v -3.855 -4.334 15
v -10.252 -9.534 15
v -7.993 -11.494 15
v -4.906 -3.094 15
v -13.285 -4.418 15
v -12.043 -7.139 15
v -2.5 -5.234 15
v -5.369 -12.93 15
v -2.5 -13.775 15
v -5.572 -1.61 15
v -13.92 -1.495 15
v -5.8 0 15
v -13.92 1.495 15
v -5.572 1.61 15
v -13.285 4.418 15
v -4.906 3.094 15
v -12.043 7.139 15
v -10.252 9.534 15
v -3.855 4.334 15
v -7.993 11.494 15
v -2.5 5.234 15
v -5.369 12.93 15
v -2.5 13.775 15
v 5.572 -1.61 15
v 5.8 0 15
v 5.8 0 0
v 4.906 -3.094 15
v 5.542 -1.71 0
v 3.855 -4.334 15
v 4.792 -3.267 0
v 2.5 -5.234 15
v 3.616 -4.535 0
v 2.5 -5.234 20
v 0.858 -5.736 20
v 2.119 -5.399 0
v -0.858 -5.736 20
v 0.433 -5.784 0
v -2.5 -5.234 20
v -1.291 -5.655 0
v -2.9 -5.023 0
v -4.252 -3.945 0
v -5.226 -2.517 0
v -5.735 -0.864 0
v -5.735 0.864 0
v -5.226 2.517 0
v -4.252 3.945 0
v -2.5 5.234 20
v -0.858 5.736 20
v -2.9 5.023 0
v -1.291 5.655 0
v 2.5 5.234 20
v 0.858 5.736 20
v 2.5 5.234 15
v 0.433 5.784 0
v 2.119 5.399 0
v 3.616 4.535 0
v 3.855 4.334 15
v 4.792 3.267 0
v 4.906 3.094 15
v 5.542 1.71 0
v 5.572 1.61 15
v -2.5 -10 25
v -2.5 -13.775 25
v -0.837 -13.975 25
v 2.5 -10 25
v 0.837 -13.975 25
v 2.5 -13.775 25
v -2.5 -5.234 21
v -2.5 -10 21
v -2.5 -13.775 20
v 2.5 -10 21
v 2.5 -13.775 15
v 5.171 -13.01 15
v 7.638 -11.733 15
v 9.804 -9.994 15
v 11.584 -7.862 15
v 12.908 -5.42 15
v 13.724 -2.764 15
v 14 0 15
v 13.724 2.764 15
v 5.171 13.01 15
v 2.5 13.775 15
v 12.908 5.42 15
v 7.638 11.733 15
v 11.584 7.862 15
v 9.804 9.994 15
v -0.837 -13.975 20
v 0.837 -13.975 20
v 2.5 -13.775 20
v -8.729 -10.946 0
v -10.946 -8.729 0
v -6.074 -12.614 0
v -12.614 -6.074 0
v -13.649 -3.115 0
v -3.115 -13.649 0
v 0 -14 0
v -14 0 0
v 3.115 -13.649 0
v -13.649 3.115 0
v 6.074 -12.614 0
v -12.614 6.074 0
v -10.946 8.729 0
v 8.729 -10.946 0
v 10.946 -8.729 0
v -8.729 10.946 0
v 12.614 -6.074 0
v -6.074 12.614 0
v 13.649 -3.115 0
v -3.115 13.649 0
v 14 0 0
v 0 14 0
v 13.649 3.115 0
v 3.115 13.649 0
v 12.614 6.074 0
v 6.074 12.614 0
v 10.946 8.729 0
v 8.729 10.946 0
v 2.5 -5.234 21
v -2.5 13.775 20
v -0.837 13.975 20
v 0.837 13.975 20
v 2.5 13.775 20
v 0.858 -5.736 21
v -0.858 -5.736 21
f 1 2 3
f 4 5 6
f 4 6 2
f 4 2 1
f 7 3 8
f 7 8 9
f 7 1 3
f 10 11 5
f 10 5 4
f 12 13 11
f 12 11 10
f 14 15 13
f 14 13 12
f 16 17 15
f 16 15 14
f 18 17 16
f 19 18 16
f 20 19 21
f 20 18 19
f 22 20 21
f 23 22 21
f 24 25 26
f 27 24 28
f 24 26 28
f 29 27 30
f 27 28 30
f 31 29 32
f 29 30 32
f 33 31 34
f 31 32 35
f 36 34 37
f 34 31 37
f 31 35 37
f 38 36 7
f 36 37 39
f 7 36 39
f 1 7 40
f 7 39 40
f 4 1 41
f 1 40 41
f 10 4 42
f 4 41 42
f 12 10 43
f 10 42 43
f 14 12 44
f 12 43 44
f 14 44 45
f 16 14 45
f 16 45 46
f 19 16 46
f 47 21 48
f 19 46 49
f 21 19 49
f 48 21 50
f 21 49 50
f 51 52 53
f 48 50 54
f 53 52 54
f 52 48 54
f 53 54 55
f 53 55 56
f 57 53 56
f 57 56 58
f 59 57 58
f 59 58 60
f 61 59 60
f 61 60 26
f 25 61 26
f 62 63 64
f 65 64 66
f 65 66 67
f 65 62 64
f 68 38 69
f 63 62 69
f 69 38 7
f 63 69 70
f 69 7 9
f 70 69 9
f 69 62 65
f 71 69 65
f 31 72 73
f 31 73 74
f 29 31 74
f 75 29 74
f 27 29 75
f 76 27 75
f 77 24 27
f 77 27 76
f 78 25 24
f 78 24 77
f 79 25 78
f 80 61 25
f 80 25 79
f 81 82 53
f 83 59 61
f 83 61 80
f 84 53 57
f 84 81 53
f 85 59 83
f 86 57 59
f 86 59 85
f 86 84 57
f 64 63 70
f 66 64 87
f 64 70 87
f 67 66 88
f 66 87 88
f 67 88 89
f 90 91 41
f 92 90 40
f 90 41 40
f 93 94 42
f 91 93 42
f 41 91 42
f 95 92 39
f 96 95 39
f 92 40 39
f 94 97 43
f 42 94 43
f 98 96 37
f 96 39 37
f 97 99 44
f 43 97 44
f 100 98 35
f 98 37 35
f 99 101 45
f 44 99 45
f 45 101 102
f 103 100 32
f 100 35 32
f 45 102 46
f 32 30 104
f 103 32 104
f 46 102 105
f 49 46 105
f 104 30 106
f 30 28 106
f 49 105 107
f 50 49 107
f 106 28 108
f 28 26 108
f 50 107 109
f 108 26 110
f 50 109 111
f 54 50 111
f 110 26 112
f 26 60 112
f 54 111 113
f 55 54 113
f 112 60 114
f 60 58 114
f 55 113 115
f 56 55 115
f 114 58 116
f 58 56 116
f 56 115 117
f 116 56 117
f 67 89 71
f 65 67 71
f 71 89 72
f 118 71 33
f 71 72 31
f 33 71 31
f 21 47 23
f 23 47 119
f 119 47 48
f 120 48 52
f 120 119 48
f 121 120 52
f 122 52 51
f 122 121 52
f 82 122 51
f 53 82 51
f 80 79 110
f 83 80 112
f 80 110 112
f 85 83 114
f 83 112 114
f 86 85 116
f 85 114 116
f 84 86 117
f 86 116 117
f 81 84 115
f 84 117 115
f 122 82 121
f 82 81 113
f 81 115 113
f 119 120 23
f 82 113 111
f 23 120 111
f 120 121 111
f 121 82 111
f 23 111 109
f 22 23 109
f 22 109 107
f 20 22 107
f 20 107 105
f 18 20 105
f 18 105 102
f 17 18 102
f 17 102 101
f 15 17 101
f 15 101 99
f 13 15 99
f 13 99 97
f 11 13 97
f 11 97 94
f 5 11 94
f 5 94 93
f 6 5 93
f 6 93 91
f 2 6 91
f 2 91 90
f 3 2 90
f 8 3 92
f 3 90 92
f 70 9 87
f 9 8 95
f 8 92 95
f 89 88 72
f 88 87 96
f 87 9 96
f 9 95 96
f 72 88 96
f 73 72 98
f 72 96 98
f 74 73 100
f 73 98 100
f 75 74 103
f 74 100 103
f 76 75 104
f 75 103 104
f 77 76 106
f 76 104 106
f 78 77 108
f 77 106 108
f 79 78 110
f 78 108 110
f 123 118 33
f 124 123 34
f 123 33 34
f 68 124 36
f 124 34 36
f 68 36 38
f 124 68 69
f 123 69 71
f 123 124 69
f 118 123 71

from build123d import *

# Parameters (mm, degrees)
F0_R     = 14
F1_DEPTH = 20
F2_R     = 5.8
F3_DEPTH = 20.001
F5_DEPTH = 5
F6_DEPTH = 5
F7_DEPTH = 5
F9_DEPTH = 4


with BuildPart() as f1:
    # F0 (on Top) → F1 (new body)
    with BuildSketch(Plane.XY):
        Circle(F0_R)
    extrude(amount=F1_DEPTH)

    # F2 (on face) → F3 (cut, through all)
    with BuildSketch(Plane(origin=(0, 0, 0), x_dir=(1, 0, 0), z_dir=(0, 0, -1))):
        Circle(F2_R)
    extrude(amount=-F3_DEPTH, mode=Mode.SUBTRACT)

    # F4 (on face) → F5 (cut)
    with BuildSketch(Plane.XY.offset(20)):
        with BuildLine():
            Line((-2.5, 5.2335456433), (-2.5, 13.774977314))
            ThreePointArc((-2.5, 13.774977314), (-14, 0), (-2.5, -13.774977314))
            Line((-2.5, -13.774977314), (-2.5, -5.2335456433))
            ThreePointArc((-2.5, -5.2335456433), (-5.8, 0), (-2.5, 5.2335456433))
        make_face()
    extrude(amount=-F5_DEPTH, mode=Mode.SUBTRACT)

    # F4 (on face) → F6 (cut)
    with BuildSketch(Plane.XY.offset(20)):
        with BuildLine():
            ThreePointArc((14, 0), (10.7470926301, 8.9721792225), (2.5, 13.774977314))
            Line((2.5, 13.774977314), (2.5, 5.2335456433))
            ThreePointArc((2.5, 5.2335456433), (4.9061186288, 3.0935416597), (5.8, 0))
            ThreePointArc((5.8, 0), (4.9061186288, -3.0935416597), (2.5, -5.2335456433))
            Line((2.5, -5.2335456433), (2.5, -13.774977314))
            ThreePointArc((2.5, -13.774977314), (10.7470926301, -8.9721792225), (14, 0))
        make_face()
    extrude(amount=-F6_DEPTH, mode=Mode.SUBTRACT)

    # F4 (on face) → F7 (join)
    with BuildSketch(Plane.XY.offset(20)):
        with BuildLine():
            Line((2.5, -13.774977314), (2.5, -5.2335456433))
            ThreePointArc((2.5, -5.2335456433), (0, -5.8), (-2.5, -5.2335456433))
            Line((-2.5, -5.2335456433), (-2.5, -13.774977314))
            ThreePointArc((-2.5, -13.774977314), (0, -14), (2.5, -13.774977314))
        make_face()
    extrude(amount=F7_DEPTH)

    # F8 (on face) → F9 (cut)
    with BuildSketch(Plane.XY.offset(25)):
        with BuildLine():
            Line((-2.5, -5.2335456433), (-2.5, -10))
            Line((-2.5, -10), (2.5, -10))
            Line((2.5, -10), (2.5, -5.2335456433))
            ThreePointArc((2.5, -5.2335456433), (0, -5.8), (-2.5, -5.2335456433))
        make_face()
    extrude(amount=-F9_DEPTH, mode=Mode.SUBTRACT)


solid = f1.part
